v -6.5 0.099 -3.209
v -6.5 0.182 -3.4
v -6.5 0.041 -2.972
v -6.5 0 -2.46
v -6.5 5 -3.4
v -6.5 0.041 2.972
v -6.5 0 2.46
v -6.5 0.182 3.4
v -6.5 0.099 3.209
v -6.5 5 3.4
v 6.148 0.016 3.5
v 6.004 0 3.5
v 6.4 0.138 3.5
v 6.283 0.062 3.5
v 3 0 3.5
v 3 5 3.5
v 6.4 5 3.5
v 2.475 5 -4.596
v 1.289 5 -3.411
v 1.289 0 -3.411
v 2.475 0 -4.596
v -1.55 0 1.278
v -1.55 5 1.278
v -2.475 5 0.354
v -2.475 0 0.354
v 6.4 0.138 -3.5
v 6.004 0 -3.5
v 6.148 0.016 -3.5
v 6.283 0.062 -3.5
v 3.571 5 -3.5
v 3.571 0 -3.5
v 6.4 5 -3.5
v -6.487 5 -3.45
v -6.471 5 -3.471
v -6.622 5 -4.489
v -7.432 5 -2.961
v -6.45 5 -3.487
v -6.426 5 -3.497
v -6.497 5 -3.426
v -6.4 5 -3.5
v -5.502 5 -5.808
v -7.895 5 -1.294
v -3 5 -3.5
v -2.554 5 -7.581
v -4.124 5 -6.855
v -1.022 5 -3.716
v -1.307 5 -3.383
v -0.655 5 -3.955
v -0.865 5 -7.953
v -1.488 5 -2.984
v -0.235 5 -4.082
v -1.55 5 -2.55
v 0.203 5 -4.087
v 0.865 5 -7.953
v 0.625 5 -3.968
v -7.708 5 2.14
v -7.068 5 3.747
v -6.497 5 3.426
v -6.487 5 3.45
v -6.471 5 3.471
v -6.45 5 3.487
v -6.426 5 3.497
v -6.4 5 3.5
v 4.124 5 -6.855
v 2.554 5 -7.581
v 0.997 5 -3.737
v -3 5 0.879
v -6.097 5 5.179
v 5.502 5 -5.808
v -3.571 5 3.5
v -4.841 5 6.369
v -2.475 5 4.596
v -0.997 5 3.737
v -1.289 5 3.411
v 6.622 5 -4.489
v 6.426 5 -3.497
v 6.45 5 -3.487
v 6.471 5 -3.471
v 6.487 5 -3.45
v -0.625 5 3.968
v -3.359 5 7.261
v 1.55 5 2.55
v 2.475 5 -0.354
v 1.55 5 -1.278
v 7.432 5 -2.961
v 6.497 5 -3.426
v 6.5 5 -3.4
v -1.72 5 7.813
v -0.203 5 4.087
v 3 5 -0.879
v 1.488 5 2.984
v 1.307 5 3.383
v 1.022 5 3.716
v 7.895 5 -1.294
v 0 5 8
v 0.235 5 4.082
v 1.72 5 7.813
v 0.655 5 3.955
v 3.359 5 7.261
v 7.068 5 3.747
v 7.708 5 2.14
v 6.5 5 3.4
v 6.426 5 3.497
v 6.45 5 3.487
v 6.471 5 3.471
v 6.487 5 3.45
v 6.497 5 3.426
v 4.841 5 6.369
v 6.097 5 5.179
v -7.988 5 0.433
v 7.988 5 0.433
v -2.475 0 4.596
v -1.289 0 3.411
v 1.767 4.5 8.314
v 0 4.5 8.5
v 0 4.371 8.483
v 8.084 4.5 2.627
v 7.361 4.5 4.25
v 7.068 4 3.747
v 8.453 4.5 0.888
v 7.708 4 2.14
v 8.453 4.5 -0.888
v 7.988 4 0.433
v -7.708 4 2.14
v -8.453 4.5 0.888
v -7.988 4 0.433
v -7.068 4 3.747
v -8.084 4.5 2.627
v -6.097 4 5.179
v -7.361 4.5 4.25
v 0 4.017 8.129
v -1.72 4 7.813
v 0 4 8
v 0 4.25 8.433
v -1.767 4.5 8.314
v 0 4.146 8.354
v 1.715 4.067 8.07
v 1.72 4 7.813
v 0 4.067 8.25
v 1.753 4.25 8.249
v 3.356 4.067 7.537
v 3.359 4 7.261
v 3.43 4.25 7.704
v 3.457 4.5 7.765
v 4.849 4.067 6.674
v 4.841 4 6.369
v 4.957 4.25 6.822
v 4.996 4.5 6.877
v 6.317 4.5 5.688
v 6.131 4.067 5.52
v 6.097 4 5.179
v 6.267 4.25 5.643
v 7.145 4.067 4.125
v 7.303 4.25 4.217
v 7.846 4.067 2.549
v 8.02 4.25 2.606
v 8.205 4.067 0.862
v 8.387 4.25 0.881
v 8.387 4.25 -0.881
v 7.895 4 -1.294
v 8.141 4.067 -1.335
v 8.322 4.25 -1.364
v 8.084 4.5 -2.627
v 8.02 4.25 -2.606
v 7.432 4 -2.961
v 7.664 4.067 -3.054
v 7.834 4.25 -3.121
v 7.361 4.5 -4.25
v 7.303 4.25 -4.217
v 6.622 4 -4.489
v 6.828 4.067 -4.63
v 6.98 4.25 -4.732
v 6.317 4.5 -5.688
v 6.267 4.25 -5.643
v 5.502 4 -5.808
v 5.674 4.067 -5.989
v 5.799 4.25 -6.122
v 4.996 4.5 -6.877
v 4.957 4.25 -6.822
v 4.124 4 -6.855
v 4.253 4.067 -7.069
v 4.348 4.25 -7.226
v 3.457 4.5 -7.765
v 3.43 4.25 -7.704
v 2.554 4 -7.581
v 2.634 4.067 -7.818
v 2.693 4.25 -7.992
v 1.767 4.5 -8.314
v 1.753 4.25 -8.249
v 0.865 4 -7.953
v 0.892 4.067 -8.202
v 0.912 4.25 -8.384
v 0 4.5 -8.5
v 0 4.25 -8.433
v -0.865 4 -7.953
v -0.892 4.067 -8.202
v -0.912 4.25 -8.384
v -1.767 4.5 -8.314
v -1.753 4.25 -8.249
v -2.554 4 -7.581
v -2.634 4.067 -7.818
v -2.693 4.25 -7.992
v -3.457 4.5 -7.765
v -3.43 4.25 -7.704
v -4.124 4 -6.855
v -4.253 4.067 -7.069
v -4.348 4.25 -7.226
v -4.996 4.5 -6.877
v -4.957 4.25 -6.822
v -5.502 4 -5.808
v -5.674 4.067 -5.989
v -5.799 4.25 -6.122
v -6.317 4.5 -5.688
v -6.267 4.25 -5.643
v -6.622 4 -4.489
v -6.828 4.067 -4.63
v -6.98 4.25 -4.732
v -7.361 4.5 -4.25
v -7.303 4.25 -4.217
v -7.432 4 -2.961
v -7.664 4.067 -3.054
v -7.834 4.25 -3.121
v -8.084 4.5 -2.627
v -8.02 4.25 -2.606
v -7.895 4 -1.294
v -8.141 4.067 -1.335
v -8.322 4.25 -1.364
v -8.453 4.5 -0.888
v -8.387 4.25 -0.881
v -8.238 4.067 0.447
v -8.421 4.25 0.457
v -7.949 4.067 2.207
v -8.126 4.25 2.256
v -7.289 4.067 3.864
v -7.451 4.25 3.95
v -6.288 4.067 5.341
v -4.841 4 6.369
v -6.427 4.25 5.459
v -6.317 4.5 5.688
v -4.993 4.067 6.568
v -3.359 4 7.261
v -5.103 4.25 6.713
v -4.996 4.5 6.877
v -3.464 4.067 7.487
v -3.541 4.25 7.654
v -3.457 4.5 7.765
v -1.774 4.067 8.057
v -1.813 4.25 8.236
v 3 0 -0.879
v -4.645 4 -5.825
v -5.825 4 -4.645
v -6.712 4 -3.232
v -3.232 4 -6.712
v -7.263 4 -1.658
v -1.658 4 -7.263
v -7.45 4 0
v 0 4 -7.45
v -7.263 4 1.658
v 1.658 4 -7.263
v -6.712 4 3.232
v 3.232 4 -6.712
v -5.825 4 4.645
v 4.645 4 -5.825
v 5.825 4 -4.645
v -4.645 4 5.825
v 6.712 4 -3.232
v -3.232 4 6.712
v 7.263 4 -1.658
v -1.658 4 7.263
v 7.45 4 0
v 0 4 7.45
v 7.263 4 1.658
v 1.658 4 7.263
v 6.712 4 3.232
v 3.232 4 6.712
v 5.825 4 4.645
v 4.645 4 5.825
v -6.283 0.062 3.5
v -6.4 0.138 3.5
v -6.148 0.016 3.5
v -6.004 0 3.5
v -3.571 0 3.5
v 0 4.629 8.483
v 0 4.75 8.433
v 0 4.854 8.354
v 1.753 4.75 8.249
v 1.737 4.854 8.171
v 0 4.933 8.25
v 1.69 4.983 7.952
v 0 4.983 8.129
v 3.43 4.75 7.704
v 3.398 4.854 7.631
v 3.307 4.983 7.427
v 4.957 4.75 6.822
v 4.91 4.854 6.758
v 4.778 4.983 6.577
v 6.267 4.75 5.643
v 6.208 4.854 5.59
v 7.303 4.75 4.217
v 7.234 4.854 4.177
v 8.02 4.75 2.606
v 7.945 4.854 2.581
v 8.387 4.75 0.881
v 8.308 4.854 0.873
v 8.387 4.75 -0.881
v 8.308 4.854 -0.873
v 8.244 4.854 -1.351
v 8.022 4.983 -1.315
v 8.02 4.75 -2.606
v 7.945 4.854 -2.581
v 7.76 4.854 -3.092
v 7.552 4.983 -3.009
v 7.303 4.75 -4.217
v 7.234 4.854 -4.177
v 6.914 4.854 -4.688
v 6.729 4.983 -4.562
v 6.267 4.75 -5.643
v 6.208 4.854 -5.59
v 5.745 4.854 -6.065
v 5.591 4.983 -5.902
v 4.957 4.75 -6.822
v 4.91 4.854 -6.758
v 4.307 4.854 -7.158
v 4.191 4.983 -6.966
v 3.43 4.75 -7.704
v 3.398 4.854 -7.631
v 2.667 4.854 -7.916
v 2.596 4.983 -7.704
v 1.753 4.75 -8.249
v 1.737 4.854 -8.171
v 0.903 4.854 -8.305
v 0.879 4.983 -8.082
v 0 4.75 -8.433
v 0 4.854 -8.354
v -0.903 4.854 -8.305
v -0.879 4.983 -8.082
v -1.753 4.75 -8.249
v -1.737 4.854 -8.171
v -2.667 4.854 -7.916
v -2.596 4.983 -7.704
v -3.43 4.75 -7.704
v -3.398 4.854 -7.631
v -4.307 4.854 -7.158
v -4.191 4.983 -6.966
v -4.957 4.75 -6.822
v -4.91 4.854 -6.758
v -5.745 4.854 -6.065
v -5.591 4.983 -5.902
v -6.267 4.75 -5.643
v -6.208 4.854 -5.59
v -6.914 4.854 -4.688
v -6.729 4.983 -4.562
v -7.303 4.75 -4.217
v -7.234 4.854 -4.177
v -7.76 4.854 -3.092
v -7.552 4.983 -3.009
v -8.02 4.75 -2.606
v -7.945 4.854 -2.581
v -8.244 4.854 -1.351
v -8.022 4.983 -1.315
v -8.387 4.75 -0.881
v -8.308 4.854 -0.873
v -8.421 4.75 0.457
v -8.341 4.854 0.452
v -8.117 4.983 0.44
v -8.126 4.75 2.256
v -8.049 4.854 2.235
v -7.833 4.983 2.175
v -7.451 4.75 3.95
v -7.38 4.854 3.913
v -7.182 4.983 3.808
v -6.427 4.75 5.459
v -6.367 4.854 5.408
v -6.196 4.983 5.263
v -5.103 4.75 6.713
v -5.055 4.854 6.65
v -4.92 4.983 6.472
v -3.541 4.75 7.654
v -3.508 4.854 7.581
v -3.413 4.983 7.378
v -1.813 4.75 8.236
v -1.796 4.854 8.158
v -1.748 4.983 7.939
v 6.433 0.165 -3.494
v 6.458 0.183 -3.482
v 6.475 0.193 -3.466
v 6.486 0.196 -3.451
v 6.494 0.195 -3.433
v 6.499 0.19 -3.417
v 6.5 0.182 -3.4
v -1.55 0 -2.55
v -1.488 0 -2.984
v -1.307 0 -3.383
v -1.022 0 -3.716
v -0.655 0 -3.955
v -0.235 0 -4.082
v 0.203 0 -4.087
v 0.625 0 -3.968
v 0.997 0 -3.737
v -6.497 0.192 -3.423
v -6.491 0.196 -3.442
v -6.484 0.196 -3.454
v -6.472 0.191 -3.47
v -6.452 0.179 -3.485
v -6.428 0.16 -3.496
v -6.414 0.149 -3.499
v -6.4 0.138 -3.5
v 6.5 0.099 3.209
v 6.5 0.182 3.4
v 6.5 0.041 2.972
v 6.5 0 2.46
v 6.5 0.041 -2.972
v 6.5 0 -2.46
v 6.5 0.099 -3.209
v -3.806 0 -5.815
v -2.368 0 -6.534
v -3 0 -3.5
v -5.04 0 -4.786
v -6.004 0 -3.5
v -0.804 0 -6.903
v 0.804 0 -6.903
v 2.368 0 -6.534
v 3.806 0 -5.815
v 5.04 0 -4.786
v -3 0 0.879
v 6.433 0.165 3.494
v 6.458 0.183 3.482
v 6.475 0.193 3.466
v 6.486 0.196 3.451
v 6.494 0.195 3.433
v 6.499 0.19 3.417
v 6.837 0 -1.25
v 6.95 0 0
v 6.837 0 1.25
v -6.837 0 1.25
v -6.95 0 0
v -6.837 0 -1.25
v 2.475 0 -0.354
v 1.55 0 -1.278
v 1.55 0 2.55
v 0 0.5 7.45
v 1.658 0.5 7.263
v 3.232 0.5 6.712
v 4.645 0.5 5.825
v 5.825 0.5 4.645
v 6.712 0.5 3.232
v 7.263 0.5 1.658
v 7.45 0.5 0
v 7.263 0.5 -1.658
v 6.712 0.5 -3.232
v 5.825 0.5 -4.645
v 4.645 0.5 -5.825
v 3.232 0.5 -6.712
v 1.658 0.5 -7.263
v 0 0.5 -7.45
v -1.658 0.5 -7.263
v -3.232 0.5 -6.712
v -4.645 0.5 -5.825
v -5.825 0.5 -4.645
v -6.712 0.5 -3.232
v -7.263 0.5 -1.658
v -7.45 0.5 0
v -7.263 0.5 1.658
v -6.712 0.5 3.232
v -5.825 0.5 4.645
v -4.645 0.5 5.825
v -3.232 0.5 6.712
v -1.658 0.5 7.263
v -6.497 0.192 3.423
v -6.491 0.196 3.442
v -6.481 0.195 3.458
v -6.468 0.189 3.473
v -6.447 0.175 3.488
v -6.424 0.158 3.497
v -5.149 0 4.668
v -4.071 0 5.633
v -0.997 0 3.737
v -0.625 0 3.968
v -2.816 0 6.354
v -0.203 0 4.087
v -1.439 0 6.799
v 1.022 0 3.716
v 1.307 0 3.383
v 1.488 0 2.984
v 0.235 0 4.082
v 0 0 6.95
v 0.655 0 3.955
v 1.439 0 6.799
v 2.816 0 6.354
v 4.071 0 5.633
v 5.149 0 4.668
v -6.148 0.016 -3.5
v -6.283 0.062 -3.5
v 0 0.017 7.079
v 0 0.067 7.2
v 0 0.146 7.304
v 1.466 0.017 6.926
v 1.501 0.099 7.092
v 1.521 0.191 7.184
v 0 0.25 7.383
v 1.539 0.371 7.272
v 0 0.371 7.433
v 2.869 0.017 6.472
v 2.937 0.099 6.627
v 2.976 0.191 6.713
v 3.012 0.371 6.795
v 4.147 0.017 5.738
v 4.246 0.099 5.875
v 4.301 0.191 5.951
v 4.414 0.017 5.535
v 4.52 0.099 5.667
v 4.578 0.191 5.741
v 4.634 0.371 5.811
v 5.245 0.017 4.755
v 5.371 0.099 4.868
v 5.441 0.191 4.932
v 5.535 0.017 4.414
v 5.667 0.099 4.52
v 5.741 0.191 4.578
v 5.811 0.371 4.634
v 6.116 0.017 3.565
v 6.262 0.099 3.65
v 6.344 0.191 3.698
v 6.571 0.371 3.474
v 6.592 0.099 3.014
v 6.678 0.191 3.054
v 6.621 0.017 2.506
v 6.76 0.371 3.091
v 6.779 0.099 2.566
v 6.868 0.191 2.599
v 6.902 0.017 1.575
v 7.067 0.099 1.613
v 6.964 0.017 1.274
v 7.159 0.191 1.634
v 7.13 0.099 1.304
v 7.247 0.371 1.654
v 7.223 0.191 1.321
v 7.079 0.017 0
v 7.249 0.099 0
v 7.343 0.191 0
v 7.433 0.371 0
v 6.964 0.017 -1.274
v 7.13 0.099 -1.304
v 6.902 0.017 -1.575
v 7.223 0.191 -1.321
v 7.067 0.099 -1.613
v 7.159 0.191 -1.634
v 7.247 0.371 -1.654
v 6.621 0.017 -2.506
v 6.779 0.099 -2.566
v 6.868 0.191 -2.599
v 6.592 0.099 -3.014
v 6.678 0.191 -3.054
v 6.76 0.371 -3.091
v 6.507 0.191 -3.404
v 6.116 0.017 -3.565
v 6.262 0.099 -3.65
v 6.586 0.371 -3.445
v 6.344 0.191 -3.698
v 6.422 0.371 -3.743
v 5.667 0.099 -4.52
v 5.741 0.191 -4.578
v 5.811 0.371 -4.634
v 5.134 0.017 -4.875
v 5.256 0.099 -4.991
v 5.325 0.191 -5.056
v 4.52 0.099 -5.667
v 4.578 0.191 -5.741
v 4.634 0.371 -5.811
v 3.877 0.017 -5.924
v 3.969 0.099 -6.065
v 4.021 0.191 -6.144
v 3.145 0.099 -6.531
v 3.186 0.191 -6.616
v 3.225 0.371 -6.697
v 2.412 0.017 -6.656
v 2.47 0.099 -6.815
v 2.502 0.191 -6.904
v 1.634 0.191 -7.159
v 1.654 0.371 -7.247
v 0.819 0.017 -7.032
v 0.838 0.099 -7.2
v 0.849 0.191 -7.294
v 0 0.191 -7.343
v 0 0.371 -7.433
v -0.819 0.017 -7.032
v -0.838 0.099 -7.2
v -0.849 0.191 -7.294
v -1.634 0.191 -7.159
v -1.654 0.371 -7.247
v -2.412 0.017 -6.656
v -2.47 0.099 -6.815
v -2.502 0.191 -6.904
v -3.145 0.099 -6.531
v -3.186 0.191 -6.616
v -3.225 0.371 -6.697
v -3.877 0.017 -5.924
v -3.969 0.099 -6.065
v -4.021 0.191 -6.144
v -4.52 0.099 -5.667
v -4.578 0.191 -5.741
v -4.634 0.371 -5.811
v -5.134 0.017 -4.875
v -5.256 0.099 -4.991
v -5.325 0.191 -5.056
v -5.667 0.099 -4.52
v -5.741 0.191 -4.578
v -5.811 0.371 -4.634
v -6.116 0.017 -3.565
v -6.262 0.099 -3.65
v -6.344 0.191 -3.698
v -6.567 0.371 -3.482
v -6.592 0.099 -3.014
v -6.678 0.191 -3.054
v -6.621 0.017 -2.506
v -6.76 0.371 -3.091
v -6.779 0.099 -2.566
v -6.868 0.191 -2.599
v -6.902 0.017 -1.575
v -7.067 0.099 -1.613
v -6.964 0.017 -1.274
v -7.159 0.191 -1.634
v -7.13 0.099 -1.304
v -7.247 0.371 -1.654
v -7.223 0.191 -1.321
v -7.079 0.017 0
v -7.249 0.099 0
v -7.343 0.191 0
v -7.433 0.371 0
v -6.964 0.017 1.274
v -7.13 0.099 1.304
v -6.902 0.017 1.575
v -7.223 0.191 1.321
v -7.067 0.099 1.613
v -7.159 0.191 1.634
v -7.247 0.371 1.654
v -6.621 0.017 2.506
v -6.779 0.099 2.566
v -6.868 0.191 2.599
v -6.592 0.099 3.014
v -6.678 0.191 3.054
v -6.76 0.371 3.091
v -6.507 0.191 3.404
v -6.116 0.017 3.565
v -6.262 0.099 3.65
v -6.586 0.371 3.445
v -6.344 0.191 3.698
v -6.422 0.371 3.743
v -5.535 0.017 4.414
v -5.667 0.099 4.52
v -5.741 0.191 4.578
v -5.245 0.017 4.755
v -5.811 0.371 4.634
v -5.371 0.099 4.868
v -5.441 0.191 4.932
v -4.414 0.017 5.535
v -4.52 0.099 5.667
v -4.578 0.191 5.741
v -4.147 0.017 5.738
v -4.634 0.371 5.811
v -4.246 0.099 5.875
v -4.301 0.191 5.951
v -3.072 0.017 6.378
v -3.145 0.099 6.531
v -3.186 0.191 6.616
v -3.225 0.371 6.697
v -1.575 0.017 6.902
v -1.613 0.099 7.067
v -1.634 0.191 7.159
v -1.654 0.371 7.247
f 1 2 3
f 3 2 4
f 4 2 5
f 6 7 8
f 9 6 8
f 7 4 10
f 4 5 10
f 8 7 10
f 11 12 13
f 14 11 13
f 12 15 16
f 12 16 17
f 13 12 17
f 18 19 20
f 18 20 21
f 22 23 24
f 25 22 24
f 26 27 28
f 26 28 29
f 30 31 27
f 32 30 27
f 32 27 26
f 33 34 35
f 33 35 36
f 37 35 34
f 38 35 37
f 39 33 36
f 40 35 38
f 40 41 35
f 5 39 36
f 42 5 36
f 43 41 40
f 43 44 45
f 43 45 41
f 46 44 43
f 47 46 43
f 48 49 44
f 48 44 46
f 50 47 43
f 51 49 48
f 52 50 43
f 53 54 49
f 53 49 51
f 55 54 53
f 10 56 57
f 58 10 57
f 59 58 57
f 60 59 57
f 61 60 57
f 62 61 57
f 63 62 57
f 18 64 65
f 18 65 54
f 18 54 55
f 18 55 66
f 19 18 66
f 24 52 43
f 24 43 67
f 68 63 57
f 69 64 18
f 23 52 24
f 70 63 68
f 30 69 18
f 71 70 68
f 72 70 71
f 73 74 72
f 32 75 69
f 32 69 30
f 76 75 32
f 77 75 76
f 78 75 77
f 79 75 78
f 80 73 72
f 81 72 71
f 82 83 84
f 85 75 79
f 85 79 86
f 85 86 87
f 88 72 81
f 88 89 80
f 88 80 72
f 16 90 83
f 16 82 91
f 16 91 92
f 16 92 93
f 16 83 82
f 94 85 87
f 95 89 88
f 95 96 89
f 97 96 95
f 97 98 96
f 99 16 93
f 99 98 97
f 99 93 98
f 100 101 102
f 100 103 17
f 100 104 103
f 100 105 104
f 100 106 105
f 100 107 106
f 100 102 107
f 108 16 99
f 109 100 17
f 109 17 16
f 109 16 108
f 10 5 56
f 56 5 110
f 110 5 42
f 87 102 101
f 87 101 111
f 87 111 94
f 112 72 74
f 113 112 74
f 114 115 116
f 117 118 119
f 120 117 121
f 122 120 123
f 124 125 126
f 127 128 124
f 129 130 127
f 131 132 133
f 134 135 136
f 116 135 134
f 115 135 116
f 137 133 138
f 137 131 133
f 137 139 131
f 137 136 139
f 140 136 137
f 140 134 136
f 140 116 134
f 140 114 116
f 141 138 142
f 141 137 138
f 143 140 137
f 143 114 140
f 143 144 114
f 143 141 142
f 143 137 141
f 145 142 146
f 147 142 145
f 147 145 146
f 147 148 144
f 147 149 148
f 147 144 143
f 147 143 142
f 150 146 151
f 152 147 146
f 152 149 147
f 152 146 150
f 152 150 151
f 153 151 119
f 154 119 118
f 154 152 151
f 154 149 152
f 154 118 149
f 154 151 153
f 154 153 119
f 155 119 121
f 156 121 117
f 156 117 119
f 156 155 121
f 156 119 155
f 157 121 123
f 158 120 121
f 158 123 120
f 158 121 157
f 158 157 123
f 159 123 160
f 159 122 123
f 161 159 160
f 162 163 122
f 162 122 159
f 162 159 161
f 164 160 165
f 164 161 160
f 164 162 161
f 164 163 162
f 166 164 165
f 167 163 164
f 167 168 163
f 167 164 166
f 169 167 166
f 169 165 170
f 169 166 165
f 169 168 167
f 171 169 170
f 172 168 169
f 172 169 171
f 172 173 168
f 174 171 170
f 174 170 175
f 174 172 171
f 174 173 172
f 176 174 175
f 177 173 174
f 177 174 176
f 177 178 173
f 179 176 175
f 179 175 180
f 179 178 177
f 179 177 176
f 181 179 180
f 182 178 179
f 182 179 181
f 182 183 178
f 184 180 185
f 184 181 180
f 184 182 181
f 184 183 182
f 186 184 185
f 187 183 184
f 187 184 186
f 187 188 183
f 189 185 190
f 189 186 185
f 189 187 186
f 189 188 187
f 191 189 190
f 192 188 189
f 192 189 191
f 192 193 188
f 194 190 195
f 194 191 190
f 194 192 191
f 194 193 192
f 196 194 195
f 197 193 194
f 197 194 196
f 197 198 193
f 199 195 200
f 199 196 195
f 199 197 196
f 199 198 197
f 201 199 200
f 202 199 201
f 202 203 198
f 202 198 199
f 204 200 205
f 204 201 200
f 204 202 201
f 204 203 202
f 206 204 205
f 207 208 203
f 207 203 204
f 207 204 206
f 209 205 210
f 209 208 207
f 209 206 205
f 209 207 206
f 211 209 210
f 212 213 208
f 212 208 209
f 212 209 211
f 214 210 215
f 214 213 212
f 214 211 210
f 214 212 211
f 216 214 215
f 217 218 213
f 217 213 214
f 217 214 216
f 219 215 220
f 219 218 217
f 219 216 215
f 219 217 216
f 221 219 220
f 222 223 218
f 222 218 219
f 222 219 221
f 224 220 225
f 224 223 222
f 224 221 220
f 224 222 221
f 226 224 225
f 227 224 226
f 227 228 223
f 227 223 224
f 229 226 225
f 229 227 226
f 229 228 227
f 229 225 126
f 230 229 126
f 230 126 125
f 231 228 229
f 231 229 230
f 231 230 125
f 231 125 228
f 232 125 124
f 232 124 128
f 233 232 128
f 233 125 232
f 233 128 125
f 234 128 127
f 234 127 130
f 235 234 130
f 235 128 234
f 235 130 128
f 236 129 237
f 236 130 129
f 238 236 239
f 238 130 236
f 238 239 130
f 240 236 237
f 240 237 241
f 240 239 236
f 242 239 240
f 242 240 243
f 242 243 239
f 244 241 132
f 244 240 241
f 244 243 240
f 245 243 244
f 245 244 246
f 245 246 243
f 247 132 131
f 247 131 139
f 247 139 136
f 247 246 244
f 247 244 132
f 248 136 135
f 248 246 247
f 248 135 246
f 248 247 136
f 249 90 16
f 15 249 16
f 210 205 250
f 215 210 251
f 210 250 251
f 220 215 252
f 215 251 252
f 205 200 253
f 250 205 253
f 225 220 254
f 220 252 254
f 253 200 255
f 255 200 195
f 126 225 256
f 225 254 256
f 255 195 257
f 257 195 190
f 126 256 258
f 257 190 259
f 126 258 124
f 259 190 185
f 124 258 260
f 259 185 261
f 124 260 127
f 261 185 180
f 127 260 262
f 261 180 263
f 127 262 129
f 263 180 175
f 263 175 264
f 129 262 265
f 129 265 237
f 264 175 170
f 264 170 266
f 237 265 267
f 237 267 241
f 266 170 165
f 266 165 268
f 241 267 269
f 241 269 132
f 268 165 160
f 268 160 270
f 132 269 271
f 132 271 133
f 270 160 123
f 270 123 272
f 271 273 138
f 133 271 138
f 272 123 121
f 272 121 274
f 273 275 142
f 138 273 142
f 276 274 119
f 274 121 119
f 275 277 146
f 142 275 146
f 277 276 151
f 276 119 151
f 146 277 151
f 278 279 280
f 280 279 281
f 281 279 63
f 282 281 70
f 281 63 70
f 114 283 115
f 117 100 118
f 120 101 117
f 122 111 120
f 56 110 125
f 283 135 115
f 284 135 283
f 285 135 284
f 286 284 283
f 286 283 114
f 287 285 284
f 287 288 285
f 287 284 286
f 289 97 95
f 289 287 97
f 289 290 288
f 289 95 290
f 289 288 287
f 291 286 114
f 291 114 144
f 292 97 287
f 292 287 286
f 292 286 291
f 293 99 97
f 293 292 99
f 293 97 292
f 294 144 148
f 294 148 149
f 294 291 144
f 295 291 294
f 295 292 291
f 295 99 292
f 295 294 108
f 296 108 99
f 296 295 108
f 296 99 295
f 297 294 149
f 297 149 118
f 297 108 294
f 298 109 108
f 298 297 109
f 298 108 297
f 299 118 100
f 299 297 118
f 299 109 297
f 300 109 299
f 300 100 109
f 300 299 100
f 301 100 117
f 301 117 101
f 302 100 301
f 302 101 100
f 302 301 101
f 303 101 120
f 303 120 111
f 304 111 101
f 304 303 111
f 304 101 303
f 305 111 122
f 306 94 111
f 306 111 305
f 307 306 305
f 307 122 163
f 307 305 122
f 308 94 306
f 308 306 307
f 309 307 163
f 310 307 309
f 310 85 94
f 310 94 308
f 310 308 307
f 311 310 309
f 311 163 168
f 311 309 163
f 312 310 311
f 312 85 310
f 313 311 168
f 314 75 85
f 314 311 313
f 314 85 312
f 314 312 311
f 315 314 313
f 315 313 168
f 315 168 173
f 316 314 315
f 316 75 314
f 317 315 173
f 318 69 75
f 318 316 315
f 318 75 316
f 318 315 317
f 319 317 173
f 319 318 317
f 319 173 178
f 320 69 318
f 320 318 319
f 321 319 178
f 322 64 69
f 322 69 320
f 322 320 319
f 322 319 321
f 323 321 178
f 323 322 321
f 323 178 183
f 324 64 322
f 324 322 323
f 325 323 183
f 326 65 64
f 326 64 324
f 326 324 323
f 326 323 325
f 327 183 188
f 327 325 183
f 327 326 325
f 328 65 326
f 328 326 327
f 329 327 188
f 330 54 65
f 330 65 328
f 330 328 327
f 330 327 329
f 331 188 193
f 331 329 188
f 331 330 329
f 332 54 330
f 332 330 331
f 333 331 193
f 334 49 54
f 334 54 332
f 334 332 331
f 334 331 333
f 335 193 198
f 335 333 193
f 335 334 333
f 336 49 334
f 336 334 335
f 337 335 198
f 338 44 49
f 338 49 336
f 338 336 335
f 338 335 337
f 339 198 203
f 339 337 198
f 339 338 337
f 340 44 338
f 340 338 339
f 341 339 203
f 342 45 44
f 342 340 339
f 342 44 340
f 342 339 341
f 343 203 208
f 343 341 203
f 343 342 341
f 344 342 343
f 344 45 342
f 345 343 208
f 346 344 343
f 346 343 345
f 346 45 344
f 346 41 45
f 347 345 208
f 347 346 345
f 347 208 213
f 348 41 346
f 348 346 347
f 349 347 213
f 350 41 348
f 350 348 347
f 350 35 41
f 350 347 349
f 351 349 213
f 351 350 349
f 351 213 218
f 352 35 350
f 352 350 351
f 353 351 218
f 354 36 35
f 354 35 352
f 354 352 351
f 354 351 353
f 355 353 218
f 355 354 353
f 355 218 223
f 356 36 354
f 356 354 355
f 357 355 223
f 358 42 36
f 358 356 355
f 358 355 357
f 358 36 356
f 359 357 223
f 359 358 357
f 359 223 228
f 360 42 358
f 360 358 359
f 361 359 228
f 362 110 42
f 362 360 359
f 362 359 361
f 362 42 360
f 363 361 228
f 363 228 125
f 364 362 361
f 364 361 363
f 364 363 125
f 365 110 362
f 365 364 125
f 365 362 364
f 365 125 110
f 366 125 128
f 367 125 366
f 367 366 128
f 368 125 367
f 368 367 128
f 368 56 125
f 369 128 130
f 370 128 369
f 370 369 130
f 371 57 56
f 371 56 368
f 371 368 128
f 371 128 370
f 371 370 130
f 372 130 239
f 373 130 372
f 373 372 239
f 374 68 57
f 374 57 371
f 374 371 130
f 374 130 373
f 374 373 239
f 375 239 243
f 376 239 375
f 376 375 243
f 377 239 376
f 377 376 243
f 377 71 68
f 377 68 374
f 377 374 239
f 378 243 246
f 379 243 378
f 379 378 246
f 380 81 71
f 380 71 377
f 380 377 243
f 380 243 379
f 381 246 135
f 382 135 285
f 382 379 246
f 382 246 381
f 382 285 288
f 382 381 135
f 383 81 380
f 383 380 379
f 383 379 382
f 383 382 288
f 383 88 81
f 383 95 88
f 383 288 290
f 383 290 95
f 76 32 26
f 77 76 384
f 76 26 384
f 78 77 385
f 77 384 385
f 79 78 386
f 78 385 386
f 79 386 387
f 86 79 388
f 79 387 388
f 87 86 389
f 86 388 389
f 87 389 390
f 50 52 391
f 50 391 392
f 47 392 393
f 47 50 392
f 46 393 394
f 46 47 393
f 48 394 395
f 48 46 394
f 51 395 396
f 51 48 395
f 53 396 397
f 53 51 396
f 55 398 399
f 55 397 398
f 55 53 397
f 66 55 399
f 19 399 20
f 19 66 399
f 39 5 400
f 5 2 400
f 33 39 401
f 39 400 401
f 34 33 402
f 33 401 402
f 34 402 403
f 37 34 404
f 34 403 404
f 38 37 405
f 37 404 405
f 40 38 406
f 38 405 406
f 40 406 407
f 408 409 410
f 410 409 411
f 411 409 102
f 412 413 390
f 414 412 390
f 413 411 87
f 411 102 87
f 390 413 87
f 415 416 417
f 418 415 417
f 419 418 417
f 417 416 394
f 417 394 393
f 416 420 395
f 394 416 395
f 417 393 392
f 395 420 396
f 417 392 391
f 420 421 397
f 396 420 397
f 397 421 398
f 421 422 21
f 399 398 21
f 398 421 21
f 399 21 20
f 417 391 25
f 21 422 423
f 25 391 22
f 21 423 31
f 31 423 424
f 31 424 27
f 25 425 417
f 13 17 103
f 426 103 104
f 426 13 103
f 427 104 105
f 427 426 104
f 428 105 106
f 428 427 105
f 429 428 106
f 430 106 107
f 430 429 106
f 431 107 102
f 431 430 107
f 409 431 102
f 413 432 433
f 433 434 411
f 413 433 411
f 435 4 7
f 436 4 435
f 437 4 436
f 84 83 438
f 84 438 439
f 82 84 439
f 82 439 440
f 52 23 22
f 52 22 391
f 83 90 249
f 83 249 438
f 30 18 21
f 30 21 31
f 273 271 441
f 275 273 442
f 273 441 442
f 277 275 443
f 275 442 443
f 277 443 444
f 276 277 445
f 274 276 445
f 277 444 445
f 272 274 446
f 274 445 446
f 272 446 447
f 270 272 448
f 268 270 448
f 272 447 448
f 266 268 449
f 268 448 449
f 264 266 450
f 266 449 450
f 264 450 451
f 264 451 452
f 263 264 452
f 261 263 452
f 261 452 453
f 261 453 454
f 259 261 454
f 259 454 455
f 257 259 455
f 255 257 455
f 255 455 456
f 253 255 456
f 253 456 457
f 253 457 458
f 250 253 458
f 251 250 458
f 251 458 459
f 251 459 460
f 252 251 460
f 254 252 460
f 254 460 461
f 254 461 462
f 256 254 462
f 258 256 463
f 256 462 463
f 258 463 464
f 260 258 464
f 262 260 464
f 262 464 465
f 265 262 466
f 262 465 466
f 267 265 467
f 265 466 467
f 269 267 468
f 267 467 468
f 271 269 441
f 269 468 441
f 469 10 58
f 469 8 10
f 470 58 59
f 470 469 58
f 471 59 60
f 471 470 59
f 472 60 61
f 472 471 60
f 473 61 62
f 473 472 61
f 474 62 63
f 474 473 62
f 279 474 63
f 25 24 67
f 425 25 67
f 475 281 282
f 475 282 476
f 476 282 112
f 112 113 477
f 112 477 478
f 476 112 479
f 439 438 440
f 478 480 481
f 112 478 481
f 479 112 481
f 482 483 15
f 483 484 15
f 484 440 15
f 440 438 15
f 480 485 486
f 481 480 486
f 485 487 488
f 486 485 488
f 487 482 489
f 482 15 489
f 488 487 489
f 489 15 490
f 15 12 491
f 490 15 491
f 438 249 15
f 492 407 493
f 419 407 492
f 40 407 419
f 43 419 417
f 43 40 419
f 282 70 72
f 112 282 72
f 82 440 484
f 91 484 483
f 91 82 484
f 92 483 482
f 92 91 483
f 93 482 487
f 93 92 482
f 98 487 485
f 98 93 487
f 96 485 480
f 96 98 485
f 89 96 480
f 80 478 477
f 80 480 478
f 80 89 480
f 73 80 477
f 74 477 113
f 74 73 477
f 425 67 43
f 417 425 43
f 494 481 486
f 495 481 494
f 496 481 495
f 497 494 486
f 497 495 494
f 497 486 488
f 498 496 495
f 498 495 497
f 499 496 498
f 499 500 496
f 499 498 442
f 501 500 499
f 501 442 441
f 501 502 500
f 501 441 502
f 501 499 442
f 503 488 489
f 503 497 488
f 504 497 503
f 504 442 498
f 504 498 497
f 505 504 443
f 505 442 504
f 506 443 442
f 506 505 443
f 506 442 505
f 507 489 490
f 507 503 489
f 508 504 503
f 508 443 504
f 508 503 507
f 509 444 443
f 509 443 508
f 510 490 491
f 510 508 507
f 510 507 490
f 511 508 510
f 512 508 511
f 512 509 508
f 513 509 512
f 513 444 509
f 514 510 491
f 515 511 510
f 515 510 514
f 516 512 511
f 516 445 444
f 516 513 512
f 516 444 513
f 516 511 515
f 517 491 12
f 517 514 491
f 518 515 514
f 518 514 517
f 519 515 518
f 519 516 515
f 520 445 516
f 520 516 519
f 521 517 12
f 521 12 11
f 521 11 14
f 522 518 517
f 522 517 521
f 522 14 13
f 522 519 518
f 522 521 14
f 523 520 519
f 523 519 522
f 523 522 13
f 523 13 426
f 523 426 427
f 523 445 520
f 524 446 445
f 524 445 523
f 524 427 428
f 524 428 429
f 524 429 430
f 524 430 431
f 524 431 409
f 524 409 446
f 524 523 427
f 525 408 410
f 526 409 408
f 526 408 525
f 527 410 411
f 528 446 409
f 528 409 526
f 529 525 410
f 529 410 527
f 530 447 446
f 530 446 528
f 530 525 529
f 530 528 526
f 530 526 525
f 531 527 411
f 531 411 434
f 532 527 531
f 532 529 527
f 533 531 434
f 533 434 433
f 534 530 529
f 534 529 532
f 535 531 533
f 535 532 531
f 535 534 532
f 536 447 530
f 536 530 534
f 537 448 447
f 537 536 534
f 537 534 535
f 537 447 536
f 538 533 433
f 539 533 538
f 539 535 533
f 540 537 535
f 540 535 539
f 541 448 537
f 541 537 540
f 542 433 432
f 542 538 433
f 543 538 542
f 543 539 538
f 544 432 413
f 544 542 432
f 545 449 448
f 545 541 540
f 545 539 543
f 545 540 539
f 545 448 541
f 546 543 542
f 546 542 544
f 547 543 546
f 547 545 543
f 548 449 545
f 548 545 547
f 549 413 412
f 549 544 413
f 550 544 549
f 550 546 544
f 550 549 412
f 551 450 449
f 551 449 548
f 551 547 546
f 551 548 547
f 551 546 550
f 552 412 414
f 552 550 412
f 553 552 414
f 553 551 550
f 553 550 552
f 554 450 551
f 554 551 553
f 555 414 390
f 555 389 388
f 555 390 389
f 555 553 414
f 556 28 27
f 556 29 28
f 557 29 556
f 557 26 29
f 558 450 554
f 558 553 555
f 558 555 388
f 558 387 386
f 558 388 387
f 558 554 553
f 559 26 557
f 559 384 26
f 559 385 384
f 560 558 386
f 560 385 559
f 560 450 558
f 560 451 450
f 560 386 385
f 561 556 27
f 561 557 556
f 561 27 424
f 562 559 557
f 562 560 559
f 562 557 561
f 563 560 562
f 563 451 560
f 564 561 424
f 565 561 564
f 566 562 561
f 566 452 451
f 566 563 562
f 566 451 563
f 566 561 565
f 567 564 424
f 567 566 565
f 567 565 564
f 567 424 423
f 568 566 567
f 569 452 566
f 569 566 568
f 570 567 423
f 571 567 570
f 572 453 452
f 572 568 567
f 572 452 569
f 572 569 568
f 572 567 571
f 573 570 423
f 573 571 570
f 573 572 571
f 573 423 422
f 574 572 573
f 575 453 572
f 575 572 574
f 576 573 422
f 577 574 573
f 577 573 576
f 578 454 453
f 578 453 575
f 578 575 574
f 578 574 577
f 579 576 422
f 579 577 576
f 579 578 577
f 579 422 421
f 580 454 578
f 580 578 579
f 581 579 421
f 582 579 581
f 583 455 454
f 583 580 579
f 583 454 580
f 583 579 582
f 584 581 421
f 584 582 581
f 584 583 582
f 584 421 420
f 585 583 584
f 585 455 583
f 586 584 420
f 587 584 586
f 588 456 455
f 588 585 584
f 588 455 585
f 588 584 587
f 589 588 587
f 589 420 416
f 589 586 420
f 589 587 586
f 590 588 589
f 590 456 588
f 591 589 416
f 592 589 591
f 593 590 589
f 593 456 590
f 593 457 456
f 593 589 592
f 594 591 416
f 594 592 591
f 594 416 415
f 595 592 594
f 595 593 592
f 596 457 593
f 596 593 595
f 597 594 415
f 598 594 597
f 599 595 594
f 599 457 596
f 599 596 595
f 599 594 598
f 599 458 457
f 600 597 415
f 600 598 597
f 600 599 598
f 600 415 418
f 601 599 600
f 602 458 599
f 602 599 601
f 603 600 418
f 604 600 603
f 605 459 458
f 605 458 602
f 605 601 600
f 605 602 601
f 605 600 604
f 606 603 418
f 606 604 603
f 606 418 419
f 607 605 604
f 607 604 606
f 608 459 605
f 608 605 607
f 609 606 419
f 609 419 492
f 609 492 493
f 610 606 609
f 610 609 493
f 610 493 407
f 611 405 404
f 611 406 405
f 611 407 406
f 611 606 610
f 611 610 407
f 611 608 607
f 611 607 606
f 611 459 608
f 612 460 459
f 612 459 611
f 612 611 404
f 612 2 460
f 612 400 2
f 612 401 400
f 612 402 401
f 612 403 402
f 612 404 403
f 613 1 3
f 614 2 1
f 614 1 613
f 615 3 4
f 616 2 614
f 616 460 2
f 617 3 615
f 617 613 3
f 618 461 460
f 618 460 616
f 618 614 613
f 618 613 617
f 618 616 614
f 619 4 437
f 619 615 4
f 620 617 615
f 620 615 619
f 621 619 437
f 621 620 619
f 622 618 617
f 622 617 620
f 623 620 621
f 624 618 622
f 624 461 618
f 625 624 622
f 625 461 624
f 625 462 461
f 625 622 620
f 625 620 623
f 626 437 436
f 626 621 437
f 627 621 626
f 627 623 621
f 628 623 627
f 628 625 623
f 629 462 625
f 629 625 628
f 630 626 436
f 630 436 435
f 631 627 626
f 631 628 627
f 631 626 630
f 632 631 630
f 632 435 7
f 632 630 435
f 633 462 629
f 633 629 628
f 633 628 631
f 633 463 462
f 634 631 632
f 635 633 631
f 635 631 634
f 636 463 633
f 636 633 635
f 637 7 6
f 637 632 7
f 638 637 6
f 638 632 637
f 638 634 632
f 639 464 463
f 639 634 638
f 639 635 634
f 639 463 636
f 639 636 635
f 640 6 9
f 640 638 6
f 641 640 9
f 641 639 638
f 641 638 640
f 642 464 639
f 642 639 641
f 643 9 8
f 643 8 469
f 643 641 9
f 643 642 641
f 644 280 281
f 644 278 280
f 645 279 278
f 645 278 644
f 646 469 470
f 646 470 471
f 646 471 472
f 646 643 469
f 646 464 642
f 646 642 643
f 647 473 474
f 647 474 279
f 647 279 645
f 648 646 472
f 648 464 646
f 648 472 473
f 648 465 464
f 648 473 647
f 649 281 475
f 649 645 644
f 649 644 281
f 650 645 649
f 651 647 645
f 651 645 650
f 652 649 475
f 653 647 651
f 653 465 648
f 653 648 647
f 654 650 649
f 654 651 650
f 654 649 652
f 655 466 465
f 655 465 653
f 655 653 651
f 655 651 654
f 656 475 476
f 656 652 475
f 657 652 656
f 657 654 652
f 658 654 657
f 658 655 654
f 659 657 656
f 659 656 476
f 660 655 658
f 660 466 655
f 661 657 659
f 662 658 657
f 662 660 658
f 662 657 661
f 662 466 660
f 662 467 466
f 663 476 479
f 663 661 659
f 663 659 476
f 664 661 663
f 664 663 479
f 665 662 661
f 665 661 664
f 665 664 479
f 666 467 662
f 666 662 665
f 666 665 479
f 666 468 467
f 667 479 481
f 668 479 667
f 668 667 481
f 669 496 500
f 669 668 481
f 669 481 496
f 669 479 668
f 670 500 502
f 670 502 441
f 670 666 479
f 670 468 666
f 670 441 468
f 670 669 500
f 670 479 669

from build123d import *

# Parameters (mm, degrees)
SKETCH1_R           = 7.45
BOSS_EXTRUDE1_DEPTH = 4
SKETCH2_R           = 8.5
BOSS_EXTRUDE2_DEPTH = 1
SKETCH3_W           = 3.5
SKETCH3_H           = 3.5
CUT_EXTRUDE1_DEPTH  = 14.019216566
CUT_EXTRUDE2_DEPTH  = 14.019216566
CUT_EXTRUDE3_DEPTH  = 14.019216566
FILLET3_R           = 0.5
FILLET5_R           = 0.1


with BuildPart() as part:
    # Sketch1 → Boss-Extrude1 (new body)
    with BuildSketch(Plane(origin=(0, 0, 0), x_dir=(1, 0, 0), z_dir=(0, 1, 0))):
        with Locations(Location((0, 0, 0), (0, 0, 270))):
            Circle(SKETCH1_R)
    extrude(amount=BOSS_EXTRUDE1_DEPTH)

    # Sketch2 → Boss-Extrude2 (add)
    with BuildSketch(Plane(origin=(0, 4, 0), x_dir=(1, 0, 0), z_dir=(0, 1, 0))):
        with Locations(Location((0, 0, 0), (0, 0, 270))):
            Circle(SKETCH2_R)
    extrude(amount=BOSS_EXTRUDE2_DEPTH)

    # Sketch3 → Cut-Extrude1 (cut, through all)
    with BuildSketch(Plane(origin=(0, 5, 0), x_dir=(1, 0, 0), z_dir=(0, 1, 0))):
        with Locations((-4.75, 1.75)):
            Rectangle(SKETCH3_W, SKETCH3_H)
        with Locations((-4.75, -1.75)):
            Rectangle(SKETCH3_W, SKETCH3_H)
        with Locations((4.75, -1.75)):
            Rectangle(SKETCH3_W, SKETCH3_H)
        with Locations((4.75, 1.75)):
            Rectangle(SKETCH3_W, SKETCH3_H)
    extrude(amount=-CUT_EXTRUDE1_DEPTH, mode=Mode.SUBTRACT)

    # Sketch3<4> → Cut-Extrude2 (cut, through all)
    with BuildSketch(Plane(origin=(0, 5, 0), x_dir=(1, 0, 0), z_dir=(0, 1, 0))):
        with BuildLine():
            Line((-1.55, -2.55), (-1.55, 2.55))
            ThreePointArc((-1.55, 2.55), (0, 4.1), (1.55, 2.55))
            Line((1.55, 2.55), (1.55, -2.55))
            ThreePointArc((1.55, -2.55), (0, -4.1), (-1.55, -2.55))
        make_face()
    extrude(amount=-CUT_EXTRUDE2_DEPTH, mode=Mode.SUBTRACT)

    # Sketch3<5> → Cut-Extrude3 (cut, through all)
    with BuildSketch(Plane(origin=(0, 5, 0), x_dir=(1, 0, 0), z_dir=(0, 1, 0))):
        Polygon((0.353553391, 2.474873734), (2.474873734, 4.596194078), (4.596194078, 2.474873734), (2.474873734, 0.353553391), align=None)
        Polygon((-4.596194078, -2.474873734), (-2.474873734, -4.596194078), (-0.353553391, -2.474873734), (-2.474873734, -0.353553391), align=None)
    extrude(amount=-CUT_EXTRUDE3_DEPTH, mode=Mode.SUBTRACT)

    # Fillet3
    # the kernel refuses this fillet: 0.5 mm, written as the material it takes off along each edge
    with BuildSketch(Plane(origin=(0, 0, 0), x_dir=(0, 0, 1), z_dir=(-1, 0, 0))) as fillet3_piece_1:
        with BuildLine():
            CenterArc((7.45 - FILLET3_R, FILLET3_R), FILLET3_R, 270, 90)
            Line((7.45 - FILLET3_R, 0), (7.45, 0))
            Line((7.45, 0), (7.45, FILLET3_R))
        make_face()
    revolve(axis=Axis((0, 0, 0), (0, 1, 0)), mode=Mode.SUBTRACT)
    with BuildSketch(Plane(origin=(0, 4, 0), x_dir=(0, 0, 1), z_dir=(-1, 0, 0))) as fillet3_piece_2:
        with BuildLine():
            CenterArc((8.5 - FILLET3_R, FILLET3_R), FILLET3_R, 270, 90)
            Line((8.5 - FILLET3_R, 0), (8.5, 0))
            Line((8.5, 0), (8.5, FILLET3_R))
        make_face()
    revolve(axis=Axis((0, 4, 0), (0, 1, 0)), mode=Mode.SUBTRACT)
    with BuildSketch(Plane(origin=(0, 5, 0), x_dir=(0, 0, 1), z_dir=(-1, 0, 0))) as fillet3_piece_3:
        with BuildLine():
            CenterArc((8.5 - FILLET3_R, -FILLET3_R), FILLET3_R, 0, 90)
            Line((8.5 - FILLET3_R, 0), (8.5, 0))
            Line((8.5, 0), (8.5, -FILLET3_R))
        make_face()
    revolve(axis=Axis((0, 5, 0), (0, 1, 0)), mode=Mode.SUBTRACT)

    # Fillet5
    fillet5_edges = [part.edges().sort_by_distance(p)[0] for p in [
        (-6.5, 2.62448081, 3.5),
        (-6.5, 2.62448081, -3.5),
        (6.5, 2.62448081, 3.5),
        (6.5, 2.62448081, -3.5),
    ]]
    fillet(fillet5_edges, radius=FILLET5_R)


solid = part.part
